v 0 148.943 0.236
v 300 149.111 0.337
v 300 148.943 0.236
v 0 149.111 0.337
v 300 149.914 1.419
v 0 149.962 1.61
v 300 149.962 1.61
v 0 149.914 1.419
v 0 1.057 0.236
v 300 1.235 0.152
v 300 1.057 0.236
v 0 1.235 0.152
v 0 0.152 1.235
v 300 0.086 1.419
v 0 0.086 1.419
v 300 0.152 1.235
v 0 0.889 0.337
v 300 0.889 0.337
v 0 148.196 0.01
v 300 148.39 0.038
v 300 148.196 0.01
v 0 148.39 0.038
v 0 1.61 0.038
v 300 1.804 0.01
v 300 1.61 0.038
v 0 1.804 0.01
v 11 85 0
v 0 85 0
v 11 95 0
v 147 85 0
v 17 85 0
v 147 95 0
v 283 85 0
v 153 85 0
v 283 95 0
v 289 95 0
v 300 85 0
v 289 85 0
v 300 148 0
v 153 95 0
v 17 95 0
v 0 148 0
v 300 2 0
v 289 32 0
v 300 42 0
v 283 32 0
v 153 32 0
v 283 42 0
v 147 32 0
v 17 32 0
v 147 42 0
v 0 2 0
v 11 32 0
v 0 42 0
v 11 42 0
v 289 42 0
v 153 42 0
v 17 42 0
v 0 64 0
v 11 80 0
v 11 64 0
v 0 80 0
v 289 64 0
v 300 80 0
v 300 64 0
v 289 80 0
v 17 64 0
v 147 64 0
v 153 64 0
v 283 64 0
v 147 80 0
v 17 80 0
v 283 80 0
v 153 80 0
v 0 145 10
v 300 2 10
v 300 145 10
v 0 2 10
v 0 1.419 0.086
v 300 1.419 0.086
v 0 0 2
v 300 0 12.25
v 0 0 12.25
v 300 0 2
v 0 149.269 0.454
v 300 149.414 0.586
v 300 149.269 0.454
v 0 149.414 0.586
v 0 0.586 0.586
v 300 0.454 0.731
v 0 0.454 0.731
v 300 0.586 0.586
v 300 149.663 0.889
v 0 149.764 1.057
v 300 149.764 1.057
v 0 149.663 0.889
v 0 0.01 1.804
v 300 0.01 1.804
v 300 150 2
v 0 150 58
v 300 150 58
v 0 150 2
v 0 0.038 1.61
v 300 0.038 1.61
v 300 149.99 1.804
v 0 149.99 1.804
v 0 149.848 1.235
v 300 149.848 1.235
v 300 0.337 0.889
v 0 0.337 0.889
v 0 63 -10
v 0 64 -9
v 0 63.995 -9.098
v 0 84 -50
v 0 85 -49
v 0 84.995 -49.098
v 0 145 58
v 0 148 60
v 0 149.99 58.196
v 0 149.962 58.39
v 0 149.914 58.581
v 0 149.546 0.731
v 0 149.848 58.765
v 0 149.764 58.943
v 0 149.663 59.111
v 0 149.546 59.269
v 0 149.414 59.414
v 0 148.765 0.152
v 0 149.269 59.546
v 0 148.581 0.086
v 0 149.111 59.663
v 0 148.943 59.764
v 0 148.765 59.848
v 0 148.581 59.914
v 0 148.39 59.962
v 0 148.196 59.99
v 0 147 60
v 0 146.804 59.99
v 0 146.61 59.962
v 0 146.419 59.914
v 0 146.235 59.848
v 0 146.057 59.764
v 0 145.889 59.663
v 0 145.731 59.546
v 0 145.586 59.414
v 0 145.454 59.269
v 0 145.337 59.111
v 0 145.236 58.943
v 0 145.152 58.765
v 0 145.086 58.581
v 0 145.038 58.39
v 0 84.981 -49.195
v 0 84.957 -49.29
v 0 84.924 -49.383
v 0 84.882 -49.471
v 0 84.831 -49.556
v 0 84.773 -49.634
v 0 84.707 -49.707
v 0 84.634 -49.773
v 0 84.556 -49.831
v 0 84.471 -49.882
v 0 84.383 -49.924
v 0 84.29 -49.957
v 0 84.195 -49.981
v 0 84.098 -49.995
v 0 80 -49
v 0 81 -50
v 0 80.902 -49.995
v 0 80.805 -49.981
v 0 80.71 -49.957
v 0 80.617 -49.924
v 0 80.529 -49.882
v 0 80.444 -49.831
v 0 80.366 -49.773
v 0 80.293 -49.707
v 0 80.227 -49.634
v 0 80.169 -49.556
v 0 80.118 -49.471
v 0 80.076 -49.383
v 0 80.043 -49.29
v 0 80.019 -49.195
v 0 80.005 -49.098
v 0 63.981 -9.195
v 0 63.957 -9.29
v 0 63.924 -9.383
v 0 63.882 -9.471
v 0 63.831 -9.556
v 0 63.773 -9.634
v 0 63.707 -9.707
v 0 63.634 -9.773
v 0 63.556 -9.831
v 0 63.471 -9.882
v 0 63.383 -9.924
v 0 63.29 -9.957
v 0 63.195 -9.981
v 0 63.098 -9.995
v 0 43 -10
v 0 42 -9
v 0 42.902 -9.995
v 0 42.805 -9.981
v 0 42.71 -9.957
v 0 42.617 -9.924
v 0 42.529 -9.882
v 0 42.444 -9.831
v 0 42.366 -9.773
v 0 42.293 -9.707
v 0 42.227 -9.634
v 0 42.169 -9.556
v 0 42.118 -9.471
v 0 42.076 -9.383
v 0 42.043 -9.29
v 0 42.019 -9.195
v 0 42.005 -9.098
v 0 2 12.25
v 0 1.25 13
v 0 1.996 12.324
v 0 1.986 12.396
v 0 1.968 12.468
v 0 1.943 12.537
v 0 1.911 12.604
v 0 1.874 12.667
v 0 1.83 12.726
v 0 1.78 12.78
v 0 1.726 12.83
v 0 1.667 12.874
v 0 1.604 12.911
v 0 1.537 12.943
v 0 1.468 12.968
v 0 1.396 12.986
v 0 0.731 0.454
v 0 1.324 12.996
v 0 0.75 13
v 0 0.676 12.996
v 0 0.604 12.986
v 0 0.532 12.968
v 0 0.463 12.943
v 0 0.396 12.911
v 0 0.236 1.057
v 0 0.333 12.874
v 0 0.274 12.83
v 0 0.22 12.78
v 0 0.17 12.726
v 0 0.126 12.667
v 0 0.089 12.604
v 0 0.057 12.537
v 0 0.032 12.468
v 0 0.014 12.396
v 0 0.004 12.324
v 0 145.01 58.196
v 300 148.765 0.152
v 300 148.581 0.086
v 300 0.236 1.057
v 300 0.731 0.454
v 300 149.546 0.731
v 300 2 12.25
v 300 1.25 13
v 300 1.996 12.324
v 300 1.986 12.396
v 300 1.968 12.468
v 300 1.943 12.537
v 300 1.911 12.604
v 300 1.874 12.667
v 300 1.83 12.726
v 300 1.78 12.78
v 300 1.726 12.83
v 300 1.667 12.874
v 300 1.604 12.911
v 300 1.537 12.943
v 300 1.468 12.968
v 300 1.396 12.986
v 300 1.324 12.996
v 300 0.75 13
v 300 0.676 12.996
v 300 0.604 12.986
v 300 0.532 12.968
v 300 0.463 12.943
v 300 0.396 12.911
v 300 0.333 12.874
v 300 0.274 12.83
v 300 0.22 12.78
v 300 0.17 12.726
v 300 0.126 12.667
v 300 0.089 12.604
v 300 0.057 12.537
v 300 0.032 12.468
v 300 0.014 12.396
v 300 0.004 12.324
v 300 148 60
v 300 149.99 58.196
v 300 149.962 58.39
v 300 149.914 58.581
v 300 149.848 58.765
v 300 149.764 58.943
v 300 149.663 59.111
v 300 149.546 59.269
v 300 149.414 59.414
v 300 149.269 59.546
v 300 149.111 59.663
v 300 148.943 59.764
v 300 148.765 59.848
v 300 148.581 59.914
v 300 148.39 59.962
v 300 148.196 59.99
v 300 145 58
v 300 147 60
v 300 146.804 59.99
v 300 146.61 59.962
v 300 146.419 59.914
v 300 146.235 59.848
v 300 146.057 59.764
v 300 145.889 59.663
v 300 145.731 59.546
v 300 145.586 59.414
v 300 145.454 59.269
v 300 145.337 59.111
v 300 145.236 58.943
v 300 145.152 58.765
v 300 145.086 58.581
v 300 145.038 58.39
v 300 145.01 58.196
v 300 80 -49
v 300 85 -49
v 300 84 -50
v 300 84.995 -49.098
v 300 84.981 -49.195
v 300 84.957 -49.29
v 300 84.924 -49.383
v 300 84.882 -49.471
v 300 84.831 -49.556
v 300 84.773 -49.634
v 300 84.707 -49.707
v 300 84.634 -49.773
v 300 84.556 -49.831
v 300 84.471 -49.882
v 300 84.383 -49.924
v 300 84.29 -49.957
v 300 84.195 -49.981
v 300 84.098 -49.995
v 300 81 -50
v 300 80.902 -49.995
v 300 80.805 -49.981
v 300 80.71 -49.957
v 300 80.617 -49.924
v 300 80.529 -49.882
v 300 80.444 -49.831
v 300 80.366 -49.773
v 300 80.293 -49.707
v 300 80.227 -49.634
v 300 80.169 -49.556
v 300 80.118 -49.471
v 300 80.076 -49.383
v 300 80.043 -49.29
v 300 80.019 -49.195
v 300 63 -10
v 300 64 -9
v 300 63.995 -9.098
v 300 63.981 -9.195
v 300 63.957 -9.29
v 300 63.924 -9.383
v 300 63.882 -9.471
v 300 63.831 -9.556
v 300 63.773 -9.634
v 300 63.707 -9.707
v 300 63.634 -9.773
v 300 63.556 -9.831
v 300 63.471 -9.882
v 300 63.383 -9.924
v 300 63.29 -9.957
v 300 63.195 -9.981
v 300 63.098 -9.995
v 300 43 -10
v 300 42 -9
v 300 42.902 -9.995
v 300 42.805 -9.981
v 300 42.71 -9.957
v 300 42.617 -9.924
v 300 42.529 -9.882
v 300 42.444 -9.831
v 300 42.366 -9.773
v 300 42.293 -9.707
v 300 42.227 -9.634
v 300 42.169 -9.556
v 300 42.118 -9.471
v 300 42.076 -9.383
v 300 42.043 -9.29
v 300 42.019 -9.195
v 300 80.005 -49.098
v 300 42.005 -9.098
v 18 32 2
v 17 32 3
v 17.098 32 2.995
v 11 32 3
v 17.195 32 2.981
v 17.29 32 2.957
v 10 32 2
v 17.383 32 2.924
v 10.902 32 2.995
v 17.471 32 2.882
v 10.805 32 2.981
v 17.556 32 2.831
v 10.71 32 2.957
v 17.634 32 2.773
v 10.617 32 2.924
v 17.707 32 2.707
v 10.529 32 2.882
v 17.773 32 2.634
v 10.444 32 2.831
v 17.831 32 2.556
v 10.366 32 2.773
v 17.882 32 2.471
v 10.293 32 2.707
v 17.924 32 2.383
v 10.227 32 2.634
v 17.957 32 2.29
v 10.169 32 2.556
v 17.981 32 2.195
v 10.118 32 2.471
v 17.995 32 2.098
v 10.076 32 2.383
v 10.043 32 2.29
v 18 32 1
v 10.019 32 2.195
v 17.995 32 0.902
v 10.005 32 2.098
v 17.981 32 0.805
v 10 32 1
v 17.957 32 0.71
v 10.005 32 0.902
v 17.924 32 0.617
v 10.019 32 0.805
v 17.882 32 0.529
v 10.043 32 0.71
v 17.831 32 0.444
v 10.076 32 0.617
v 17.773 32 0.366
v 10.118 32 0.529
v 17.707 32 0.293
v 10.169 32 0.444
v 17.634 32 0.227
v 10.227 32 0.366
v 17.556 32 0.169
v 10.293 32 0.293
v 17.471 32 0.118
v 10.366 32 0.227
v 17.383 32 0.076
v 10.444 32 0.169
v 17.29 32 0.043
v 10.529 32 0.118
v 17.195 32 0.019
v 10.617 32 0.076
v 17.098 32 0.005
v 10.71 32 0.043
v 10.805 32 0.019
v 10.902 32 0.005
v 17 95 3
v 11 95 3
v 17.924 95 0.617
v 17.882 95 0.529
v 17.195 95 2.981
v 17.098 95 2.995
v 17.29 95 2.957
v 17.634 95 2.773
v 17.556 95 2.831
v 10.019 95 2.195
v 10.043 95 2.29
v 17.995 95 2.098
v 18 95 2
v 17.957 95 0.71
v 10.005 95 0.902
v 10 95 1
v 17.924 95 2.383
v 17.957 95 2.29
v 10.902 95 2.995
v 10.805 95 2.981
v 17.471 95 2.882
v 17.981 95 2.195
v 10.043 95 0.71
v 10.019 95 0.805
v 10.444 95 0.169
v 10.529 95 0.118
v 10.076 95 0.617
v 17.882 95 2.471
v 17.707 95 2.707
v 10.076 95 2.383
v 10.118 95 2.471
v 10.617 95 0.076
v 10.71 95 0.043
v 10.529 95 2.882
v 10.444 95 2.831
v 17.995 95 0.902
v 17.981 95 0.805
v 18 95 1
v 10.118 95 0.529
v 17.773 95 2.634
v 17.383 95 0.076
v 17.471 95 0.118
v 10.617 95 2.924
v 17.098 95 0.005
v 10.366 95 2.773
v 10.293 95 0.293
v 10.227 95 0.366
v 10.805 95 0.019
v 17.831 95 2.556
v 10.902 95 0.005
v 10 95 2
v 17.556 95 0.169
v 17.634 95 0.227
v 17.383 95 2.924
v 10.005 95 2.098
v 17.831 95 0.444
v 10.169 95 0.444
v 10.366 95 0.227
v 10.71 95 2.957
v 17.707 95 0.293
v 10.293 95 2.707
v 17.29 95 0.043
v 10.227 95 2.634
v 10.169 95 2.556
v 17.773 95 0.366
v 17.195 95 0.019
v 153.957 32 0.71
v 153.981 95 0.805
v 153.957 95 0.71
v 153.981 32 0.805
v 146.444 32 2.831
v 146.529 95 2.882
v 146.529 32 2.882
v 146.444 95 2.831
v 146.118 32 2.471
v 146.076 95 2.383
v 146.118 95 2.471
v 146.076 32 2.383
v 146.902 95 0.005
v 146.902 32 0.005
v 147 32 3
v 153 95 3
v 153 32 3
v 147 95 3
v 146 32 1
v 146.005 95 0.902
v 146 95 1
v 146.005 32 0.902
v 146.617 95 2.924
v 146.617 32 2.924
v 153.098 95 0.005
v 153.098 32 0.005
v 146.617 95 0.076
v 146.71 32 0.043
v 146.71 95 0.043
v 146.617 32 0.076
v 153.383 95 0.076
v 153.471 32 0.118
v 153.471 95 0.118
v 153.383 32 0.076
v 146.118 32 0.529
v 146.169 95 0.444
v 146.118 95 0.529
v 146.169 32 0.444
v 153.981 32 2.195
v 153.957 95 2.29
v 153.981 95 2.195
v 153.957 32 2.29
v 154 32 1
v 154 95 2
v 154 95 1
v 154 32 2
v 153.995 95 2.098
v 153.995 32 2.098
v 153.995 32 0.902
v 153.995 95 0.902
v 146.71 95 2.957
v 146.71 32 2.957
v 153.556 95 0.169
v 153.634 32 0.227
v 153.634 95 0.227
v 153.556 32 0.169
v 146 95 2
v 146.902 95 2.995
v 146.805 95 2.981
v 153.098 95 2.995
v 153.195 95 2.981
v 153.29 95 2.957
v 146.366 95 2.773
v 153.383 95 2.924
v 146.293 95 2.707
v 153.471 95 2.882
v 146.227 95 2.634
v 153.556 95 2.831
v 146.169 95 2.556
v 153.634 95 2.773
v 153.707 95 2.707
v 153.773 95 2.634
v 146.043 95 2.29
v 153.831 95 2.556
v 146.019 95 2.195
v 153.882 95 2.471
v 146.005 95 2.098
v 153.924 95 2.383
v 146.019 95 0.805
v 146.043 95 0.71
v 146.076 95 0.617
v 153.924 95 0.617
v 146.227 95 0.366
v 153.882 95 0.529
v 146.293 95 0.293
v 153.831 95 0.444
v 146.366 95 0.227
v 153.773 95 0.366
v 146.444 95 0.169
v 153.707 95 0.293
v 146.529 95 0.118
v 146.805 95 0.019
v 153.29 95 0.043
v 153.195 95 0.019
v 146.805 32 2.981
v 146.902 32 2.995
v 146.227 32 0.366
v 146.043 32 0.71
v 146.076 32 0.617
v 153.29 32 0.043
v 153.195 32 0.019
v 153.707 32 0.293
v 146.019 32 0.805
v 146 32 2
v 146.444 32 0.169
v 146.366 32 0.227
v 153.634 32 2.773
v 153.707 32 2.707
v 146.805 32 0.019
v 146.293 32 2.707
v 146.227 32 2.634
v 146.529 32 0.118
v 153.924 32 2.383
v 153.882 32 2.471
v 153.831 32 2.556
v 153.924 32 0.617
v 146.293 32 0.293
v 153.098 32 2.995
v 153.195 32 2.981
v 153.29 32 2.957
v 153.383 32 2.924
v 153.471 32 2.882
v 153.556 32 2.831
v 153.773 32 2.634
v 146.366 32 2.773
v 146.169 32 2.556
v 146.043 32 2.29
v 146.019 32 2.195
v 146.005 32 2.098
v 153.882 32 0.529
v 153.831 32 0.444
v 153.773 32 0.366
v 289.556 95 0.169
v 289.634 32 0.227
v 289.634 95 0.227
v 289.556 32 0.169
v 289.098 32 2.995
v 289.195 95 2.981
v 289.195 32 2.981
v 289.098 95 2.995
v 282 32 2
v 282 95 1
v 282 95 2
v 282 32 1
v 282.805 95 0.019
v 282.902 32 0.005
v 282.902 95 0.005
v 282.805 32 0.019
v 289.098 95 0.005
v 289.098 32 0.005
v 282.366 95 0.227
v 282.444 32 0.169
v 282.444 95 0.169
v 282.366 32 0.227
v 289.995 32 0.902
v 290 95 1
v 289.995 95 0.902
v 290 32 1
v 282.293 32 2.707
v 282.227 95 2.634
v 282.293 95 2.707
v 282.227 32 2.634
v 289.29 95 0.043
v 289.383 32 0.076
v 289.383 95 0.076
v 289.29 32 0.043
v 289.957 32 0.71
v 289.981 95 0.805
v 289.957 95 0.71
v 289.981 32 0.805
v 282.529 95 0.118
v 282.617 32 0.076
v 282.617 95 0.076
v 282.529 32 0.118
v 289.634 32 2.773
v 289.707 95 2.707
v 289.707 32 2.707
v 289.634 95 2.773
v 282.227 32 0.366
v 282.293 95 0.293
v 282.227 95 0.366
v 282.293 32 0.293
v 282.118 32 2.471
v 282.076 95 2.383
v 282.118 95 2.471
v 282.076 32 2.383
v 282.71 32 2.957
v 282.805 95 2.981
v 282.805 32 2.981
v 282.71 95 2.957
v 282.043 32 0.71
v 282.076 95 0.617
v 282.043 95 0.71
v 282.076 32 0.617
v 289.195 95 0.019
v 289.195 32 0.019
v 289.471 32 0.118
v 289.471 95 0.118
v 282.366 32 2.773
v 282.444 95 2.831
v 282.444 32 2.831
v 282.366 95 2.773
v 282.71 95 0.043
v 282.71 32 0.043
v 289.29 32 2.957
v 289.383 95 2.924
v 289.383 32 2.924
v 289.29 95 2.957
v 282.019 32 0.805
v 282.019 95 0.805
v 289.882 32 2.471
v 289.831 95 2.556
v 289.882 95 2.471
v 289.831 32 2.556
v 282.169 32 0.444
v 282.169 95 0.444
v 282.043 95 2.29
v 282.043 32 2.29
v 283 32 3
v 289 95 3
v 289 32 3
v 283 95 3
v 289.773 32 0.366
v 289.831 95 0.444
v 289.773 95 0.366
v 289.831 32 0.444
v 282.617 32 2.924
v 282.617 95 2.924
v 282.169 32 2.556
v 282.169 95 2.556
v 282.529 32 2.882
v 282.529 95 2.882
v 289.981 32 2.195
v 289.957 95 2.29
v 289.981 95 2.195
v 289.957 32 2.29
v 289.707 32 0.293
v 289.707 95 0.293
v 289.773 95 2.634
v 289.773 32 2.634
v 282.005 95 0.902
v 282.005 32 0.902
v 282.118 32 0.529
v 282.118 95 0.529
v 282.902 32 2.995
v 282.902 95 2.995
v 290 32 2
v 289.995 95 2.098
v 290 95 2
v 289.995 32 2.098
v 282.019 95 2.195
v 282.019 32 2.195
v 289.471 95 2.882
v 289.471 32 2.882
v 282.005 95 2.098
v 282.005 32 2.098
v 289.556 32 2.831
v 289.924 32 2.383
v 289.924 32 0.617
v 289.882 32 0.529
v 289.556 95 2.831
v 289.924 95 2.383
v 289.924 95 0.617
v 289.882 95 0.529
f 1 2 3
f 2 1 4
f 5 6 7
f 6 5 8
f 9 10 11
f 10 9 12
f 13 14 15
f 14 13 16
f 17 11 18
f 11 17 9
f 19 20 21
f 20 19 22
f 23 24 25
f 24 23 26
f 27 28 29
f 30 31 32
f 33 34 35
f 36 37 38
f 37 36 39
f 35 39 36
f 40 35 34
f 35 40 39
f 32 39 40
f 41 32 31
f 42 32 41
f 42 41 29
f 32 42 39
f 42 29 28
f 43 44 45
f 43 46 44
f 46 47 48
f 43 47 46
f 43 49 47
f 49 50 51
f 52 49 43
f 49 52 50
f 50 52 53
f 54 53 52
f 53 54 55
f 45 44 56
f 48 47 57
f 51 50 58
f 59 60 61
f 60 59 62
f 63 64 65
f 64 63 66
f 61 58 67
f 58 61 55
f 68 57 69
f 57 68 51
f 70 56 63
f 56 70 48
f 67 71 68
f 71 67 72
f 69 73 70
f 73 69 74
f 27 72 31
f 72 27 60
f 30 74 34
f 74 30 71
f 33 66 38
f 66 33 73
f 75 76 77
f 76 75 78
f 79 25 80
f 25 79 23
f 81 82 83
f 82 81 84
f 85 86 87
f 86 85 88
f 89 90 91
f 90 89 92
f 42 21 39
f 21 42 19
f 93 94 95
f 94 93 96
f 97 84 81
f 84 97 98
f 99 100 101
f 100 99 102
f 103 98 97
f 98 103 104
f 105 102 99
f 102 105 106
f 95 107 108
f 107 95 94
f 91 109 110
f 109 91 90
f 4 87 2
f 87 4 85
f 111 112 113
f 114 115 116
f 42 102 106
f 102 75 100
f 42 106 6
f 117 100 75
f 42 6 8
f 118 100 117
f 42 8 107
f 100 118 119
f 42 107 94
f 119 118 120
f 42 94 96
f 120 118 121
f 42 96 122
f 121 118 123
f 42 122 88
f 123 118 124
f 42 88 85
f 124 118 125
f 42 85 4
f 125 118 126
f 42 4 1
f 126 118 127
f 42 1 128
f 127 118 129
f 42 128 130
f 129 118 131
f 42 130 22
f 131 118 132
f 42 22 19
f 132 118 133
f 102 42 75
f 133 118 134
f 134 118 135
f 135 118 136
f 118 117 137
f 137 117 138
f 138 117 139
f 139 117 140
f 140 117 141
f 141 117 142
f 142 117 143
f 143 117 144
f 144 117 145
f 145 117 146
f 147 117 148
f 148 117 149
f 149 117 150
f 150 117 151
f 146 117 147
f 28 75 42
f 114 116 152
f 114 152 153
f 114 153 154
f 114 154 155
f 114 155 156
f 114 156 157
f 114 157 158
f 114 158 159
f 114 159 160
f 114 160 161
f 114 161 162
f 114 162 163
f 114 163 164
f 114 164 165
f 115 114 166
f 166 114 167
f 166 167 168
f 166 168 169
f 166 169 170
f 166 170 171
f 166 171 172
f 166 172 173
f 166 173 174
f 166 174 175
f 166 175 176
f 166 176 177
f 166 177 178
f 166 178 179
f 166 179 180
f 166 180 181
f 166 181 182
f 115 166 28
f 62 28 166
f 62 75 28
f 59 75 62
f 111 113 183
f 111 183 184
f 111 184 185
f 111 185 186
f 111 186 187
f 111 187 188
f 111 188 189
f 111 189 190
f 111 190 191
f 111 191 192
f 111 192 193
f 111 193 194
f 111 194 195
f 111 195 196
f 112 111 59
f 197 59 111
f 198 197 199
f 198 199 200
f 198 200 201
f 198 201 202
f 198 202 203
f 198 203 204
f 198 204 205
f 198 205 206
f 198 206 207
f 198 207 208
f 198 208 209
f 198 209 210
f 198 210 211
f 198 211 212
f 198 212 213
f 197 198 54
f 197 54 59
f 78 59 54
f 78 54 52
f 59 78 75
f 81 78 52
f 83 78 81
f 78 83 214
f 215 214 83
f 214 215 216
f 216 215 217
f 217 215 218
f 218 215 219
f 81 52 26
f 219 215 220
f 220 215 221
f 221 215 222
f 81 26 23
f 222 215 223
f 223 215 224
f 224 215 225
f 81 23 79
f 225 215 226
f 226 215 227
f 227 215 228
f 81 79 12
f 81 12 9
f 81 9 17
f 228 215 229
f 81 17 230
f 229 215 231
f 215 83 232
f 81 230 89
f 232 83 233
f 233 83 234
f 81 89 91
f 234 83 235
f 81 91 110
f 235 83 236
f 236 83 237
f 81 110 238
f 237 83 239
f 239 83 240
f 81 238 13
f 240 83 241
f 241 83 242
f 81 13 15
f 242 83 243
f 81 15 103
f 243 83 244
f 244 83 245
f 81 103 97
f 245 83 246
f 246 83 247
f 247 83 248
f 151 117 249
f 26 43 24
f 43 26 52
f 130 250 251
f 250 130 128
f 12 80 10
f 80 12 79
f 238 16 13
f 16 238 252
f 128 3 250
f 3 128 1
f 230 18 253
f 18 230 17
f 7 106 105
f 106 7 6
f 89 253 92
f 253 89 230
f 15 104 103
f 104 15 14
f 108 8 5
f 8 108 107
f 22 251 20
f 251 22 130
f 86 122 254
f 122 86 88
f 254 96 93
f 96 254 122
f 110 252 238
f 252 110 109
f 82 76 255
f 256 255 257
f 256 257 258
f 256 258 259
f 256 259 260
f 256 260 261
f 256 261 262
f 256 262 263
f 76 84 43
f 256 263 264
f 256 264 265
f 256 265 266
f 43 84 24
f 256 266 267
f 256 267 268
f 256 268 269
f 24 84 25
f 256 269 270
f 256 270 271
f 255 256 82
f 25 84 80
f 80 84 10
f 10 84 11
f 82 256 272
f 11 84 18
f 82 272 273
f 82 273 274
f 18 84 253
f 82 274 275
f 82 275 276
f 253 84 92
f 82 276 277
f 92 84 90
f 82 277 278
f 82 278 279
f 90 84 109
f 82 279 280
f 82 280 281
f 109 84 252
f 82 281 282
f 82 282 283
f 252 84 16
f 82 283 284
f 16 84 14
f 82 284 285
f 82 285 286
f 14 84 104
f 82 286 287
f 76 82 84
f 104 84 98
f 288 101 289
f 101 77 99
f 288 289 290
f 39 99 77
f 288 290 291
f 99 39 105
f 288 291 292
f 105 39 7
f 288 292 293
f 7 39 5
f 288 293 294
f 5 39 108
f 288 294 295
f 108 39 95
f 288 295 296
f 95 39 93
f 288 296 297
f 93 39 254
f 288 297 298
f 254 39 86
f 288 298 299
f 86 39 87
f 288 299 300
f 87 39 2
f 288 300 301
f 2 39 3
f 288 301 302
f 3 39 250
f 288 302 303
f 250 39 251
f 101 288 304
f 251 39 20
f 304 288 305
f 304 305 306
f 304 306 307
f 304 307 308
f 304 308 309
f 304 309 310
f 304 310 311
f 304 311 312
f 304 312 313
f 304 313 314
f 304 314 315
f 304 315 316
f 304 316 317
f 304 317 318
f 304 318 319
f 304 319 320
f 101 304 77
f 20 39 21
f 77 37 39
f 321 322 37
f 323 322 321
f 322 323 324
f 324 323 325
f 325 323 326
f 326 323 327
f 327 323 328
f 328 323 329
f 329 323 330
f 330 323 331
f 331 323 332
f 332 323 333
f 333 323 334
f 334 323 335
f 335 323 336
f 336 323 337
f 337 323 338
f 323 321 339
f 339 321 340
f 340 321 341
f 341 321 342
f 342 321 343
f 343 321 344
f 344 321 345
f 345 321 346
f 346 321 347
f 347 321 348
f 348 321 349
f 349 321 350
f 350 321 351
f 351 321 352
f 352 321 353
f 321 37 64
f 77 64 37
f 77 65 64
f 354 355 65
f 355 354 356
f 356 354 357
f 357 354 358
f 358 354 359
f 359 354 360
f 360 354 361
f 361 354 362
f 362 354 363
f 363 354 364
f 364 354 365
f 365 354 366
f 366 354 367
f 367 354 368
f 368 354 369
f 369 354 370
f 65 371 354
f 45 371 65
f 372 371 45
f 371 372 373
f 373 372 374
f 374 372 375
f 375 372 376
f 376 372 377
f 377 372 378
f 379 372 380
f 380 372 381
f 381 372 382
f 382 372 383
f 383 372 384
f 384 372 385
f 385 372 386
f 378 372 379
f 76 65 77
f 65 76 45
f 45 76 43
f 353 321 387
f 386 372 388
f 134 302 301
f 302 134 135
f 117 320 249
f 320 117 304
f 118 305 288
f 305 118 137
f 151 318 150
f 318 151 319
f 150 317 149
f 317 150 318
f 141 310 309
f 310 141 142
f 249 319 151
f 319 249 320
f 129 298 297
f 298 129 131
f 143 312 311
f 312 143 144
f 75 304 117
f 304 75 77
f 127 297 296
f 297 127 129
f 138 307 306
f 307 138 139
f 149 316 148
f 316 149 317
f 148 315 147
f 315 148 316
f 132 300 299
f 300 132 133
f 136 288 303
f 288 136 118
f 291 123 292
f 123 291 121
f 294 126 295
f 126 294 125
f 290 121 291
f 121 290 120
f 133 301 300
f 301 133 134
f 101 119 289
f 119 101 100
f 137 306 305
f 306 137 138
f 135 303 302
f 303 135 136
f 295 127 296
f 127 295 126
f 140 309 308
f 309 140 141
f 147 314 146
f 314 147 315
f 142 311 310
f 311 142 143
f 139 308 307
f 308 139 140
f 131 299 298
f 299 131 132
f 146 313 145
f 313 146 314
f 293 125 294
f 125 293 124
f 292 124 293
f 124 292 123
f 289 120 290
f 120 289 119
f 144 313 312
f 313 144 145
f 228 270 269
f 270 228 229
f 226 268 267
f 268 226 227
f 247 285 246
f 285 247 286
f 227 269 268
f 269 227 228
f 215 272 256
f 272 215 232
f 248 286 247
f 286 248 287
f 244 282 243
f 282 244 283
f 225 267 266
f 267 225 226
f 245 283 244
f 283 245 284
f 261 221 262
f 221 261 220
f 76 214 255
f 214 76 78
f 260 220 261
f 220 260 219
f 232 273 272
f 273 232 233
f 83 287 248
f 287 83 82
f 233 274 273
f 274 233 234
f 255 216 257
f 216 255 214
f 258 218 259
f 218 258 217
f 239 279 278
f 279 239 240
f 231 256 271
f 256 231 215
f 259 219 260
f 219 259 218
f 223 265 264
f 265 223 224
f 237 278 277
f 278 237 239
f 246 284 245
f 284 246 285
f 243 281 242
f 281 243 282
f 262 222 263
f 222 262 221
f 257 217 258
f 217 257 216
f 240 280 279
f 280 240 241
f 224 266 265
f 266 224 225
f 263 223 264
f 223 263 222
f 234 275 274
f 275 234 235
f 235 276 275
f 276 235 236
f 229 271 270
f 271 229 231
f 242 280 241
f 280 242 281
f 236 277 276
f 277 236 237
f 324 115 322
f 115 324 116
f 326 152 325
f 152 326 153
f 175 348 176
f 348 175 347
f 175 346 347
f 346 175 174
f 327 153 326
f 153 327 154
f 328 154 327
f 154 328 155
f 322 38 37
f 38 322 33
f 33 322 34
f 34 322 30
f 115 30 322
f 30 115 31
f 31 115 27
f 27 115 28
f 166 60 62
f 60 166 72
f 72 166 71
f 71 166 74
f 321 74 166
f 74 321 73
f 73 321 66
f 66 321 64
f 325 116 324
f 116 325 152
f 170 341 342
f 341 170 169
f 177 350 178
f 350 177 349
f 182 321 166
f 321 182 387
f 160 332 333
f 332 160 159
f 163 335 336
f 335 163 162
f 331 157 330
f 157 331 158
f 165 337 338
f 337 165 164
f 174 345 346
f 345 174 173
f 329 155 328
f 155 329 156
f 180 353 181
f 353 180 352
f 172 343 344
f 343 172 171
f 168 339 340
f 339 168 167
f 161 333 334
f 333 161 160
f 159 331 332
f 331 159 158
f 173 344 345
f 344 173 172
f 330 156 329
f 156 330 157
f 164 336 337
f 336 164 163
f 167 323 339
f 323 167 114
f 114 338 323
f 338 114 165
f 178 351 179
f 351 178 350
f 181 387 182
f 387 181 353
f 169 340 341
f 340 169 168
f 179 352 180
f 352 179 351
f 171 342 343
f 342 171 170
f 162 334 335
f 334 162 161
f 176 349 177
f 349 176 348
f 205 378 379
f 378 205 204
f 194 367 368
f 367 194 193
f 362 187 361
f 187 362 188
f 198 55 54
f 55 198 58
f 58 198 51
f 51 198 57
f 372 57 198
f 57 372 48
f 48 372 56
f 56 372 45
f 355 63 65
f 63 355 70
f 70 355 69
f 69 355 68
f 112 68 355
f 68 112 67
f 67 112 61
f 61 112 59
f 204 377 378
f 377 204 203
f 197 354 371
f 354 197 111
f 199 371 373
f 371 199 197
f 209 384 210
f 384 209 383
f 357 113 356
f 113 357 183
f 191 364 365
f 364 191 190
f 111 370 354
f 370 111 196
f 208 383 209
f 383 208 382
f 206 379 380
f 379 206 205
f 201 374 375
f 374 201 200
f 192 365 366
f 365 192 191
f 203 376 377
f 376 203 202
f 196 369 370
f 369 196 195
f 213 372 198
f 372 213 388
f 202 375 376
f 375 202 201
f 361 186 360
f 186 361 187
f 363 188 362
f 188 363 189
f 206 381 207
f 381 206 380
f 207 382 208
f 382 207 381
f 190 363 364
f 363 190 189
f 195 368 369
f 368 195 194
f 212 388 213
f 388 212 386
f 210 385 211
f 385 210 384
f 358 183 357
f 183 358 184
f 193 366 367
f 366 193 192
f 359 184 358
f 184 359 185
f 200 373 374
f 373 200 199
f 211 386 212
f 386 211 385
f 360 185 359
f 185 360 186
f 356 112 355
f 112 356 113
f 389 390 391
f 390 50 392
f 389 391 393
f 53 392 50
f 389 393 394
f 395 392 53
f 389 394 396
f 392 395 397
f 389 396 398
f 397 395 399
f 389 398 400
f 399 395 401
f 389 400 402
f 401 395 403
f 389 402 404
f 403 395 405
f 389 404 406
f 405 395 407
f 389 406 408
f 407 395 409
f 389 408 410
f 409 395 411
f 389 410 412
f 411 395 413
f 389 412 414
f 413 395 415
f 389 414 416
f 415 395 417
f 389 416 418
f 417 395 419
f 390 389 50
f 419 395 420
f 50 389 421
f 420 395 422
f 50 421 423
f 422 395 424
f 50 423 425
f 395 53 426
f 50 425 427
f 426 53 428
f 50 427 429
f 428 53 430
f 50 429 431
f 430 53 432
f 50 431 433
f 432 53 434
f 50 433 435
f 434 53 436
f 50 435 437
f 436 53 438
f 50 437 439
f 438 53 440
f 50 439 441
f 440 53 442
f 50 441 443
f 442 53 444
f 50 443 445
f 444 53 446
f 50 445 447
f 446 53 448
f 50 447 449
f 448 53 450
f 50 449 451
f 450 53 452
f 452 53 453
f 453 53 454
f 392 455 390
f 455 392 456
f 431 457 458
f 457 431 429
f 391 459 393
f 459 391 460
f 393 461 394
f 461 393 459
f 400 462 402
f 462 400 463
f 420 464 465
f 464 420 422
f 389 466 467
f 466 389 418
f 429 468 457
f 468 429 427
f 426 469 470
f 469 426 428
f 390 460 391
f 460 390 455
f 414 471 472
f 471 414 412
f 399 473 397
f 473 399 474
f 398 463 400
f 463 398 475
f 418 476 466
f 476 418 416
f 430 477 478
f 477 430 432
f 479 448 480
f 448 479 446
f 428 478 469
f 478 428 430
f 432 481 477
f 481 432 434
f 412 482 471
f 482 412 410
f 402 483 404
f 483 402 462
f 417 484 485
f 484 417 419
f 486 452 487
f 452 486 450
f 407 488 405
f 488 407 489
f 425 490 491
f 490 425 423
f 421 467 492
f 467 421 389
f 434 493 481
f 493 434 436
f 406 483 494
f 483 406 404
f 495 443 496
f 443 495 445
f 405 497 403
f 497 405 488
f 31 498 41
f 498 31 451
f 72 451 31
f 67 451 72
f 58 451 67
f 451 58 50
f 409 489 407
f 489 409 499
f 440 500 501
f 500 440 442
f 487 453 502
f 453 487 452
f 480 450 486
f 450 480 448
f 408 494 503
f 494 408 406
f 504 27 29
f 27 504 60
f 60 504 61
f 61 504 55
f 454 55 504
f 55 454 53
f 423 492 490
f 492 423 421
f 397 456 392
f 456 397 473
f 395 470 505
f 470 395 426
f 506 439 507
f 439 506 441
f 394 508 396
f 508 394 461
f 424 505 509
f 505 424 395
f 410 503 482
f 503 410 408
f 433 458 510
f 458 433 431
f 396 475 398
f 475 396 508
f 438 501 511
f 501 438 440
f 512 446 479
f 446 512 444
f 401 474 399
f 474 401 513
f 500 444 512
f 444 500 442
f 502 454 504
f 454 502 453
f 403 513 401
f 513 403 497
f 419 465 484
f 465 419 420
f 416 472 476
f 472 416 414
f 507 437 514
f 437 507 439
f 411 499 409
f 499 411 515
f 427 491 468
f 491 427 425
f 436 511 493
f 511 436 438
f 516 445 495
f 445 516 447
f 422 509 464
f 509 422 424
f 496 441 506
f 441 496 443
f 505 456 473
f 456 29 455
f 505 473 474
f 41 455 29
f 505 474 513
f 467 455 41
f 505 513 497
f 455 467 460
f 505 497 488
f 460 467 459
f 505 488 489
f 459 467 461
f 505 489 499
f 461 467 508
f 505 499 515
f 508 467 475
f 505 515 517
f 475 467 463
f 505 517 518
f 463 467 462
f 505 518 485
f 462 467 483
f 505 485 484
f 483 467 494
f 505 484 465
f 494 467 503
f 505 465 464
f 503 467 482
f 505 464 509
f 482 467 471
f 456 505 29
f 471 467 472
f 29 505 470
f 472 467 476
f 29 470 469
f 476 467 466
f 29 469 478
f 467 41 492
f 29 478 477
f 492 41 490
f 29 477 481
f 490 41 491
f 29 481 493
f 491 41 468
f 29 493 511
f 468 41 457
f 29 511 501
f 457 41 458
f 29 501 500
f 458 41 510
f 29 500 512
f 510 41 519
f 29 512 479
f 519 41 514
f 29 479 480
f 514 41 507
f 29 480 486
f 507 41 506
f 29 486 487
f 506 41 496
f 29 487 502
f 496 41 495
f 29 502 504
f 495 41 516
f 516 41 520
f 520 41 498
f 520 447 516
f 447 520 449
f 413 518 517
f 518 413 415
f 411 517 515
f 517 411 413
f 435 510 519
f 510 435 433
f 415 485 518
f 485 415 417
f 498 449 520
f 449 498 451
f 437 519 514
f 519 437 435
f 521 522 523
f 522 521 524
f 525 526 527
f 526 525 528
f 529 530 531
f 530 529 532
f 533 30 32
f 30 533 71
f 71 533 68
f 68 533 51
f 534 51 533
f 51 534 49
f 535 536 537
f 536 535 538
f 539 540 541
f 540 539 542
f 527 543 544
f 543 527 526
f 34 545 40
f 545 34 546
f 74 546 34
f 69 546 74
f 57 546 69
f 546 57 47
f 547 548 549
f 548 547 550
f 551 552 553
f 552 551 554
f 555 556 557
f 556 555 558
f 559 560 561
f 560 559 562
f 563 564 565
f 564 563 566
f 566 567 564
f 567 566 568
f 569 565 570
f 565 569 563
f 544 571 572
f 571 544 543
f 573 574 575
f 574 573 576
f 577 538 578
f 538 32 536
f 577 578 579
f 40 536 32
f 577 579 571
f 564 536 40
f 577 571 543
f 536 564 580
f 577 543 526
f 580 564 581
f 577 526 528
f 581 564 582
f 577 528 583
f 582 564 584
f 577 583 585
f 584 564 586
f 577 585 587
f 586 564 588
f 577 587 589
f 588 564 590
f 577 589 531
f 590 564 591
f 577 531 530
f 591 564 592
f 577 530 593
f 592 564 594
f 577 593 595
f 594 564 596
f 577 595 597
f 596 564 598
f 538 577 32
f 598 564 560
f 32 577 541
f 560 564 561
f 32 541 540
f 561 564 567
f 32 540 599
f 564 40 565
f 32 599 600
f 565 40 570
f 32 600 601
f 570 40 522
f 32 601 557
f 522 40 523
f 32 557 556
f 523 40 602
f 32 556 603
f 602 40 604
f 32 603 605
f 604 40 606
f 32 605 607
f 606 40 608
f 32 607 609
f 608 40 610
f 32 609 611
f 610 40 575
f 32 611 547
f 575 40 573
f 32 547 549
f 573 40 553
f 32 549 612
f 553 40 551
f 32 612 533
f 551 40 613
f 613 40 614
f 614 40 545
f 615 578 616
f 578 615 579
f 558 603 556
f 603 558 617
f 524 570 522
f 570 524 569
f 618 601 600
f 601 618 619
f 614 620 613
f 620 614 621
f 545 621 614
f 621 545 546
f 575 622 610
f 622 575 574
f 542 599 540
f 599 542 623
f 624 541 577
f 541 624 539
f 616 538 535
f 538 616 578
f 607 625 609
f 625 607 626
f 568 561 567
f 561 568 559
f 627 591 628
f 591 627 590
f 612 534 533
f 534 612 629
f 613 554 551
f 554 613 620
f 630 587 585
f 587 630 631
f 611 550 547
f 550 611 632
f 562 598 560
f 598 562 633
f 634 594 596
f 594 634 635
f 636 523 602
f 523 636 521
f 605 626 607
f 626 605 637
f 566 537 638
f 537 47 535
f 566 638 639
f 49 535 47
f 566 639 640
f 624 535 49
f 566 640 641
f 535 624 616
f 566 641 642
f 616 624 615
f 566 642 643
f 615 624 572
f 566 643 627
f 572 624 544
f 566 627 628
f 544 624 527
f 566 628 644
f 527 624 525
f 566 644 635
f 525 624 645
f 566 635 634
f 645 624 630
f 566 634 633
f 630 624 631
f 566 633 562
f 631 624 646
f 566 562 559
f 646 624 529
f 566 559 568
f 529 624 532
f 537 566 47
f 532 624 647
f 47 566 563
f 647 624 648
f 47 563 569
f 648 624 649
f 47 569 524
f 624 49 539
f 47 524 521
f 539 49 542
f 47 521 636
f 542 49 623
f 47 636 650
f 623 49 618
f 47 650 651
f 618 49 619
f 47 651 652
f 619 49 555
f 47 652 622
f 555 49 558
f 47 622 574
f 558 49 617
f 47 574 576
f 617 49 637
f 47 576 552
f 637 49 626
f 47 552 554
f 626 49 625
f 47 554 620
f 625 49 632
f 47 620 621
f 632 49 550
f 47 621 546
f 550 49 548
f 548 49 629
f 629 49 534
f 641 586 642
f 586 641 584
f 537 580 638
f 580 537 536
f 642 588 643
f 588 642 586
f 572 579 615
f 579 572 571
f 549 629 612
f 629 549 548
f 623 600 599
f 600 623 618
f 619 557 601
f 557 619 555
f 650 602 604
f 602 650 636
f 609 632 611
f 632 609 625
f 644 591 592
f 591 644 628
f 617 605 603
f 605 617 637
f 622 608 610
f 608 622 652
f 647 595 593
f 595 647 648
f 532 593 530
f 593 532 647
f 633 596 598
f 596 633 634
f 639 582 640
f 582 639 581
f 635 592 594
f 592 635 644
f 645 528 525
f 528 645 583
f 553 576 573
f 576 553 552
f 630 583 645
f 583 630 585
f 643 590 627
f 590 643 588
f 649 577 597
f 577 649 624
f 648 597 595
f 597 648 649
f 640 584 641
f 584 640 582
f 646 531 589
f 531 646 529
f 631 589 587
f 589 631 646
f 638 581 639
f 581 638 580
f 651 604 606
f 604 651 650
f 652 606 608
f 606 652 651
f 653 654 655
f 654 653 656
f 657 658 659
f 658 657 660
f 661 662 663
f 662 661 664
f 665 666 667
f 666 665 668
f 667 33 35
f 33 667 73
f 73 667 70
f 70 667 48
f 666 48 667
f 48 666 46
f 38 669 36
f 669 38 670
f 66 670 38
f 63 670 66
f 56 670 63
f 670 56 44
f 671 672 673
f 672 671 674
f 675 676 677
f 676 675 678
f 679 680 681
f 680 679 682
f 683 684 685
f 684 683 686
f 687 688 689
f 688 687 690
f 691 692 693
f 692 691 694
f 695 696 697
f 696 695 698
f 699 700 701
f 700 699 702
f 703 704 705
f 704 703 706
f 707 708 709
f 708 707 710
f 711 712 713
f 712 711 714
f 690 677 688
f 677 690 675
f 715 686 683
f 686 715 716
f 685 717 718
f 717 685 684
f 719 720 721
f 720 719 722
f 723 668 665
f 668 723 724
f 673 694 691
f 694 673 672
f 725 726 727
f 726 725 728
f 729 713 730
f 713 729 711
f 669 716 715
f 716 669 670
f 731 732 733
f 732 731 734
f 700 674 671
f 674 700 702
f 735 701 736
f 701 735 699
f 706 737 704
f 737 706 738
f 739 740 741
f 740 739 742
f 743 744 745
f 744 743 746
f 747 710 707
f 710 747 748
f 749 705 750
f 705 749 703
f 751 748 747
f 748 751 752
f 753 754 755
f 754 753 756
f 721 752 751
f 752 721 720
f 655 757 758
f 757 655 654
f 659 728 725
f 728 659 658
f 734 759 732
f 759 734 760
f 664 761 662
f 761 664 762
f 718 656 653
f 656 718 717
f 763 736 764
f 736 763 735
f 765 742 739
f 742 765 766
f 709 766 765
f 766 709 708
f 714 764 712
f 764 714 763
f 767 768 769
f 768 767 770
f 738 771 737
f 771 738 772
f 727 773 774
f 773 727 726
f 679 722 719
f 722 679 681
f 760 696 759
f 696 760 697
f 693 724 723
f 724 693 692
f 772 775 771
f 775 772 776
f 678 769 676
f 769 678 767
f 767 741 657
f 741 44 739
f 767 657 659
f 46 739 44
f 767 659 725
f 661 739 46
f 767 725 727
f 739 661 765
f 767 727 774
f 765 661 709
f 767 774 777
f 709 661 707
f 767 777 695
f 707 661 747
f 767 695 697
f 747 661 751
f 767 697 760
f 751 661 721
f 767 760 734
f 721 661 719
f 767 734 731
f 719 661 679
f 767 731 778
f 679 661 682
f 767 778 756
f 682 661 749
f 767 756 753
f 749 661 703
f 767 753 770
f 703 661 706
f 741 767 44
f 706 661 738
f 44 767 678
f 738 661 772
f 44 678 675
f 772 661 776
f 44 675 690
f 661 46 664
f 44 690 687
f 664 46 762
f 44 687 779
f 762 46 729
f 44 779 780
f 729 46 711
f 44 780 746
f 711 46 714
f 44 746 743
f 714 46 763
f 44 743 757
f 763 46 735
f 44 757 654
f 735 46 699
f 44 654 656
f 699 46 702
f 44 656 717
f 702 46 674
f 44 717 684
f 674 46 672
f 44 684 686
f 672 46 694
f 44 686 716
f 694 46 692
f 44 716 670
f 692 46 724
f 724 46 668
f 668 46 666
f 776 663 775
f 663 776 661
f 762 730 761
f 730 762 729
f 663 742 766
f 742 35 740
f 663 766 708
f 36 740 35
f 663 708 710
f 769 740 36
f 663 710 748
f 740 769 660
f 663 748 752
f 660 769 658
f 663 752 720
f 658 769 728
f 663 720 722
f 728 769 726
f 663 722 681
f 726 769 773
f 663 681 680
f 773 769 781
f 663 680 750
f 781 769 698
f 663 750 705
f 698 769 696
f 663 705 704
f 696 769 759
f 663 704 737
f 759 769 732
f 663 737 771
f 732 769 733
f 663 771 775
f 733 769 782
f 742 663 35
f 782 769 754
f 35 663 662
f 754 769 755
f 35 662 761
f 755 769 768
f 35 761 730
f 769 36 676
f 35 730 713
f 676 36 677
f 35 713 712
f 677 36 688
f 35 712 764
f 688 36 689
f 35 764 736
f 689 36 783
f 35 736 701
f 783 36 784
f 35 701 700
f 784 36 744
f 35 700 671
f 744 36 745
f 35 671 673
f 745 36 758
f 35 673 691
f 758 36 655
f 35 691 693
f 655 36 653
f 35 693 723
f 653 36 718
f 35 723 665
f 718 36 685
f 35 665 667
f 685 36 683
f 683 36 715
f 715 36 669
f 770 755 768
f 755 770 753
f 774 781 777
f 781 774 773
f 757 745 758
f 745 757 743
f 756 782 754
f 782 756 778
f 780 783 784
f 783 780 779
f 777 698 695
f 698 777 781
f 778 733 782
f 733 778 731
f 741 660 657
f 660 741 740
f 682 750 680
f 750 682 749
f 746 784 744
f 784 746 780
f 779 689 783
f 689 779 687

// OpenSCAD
// 300mm-wide bar shelf — see bar_shelf.scad for the design.
shelf_width_override = 300;
include <bar_shelf.scad>
